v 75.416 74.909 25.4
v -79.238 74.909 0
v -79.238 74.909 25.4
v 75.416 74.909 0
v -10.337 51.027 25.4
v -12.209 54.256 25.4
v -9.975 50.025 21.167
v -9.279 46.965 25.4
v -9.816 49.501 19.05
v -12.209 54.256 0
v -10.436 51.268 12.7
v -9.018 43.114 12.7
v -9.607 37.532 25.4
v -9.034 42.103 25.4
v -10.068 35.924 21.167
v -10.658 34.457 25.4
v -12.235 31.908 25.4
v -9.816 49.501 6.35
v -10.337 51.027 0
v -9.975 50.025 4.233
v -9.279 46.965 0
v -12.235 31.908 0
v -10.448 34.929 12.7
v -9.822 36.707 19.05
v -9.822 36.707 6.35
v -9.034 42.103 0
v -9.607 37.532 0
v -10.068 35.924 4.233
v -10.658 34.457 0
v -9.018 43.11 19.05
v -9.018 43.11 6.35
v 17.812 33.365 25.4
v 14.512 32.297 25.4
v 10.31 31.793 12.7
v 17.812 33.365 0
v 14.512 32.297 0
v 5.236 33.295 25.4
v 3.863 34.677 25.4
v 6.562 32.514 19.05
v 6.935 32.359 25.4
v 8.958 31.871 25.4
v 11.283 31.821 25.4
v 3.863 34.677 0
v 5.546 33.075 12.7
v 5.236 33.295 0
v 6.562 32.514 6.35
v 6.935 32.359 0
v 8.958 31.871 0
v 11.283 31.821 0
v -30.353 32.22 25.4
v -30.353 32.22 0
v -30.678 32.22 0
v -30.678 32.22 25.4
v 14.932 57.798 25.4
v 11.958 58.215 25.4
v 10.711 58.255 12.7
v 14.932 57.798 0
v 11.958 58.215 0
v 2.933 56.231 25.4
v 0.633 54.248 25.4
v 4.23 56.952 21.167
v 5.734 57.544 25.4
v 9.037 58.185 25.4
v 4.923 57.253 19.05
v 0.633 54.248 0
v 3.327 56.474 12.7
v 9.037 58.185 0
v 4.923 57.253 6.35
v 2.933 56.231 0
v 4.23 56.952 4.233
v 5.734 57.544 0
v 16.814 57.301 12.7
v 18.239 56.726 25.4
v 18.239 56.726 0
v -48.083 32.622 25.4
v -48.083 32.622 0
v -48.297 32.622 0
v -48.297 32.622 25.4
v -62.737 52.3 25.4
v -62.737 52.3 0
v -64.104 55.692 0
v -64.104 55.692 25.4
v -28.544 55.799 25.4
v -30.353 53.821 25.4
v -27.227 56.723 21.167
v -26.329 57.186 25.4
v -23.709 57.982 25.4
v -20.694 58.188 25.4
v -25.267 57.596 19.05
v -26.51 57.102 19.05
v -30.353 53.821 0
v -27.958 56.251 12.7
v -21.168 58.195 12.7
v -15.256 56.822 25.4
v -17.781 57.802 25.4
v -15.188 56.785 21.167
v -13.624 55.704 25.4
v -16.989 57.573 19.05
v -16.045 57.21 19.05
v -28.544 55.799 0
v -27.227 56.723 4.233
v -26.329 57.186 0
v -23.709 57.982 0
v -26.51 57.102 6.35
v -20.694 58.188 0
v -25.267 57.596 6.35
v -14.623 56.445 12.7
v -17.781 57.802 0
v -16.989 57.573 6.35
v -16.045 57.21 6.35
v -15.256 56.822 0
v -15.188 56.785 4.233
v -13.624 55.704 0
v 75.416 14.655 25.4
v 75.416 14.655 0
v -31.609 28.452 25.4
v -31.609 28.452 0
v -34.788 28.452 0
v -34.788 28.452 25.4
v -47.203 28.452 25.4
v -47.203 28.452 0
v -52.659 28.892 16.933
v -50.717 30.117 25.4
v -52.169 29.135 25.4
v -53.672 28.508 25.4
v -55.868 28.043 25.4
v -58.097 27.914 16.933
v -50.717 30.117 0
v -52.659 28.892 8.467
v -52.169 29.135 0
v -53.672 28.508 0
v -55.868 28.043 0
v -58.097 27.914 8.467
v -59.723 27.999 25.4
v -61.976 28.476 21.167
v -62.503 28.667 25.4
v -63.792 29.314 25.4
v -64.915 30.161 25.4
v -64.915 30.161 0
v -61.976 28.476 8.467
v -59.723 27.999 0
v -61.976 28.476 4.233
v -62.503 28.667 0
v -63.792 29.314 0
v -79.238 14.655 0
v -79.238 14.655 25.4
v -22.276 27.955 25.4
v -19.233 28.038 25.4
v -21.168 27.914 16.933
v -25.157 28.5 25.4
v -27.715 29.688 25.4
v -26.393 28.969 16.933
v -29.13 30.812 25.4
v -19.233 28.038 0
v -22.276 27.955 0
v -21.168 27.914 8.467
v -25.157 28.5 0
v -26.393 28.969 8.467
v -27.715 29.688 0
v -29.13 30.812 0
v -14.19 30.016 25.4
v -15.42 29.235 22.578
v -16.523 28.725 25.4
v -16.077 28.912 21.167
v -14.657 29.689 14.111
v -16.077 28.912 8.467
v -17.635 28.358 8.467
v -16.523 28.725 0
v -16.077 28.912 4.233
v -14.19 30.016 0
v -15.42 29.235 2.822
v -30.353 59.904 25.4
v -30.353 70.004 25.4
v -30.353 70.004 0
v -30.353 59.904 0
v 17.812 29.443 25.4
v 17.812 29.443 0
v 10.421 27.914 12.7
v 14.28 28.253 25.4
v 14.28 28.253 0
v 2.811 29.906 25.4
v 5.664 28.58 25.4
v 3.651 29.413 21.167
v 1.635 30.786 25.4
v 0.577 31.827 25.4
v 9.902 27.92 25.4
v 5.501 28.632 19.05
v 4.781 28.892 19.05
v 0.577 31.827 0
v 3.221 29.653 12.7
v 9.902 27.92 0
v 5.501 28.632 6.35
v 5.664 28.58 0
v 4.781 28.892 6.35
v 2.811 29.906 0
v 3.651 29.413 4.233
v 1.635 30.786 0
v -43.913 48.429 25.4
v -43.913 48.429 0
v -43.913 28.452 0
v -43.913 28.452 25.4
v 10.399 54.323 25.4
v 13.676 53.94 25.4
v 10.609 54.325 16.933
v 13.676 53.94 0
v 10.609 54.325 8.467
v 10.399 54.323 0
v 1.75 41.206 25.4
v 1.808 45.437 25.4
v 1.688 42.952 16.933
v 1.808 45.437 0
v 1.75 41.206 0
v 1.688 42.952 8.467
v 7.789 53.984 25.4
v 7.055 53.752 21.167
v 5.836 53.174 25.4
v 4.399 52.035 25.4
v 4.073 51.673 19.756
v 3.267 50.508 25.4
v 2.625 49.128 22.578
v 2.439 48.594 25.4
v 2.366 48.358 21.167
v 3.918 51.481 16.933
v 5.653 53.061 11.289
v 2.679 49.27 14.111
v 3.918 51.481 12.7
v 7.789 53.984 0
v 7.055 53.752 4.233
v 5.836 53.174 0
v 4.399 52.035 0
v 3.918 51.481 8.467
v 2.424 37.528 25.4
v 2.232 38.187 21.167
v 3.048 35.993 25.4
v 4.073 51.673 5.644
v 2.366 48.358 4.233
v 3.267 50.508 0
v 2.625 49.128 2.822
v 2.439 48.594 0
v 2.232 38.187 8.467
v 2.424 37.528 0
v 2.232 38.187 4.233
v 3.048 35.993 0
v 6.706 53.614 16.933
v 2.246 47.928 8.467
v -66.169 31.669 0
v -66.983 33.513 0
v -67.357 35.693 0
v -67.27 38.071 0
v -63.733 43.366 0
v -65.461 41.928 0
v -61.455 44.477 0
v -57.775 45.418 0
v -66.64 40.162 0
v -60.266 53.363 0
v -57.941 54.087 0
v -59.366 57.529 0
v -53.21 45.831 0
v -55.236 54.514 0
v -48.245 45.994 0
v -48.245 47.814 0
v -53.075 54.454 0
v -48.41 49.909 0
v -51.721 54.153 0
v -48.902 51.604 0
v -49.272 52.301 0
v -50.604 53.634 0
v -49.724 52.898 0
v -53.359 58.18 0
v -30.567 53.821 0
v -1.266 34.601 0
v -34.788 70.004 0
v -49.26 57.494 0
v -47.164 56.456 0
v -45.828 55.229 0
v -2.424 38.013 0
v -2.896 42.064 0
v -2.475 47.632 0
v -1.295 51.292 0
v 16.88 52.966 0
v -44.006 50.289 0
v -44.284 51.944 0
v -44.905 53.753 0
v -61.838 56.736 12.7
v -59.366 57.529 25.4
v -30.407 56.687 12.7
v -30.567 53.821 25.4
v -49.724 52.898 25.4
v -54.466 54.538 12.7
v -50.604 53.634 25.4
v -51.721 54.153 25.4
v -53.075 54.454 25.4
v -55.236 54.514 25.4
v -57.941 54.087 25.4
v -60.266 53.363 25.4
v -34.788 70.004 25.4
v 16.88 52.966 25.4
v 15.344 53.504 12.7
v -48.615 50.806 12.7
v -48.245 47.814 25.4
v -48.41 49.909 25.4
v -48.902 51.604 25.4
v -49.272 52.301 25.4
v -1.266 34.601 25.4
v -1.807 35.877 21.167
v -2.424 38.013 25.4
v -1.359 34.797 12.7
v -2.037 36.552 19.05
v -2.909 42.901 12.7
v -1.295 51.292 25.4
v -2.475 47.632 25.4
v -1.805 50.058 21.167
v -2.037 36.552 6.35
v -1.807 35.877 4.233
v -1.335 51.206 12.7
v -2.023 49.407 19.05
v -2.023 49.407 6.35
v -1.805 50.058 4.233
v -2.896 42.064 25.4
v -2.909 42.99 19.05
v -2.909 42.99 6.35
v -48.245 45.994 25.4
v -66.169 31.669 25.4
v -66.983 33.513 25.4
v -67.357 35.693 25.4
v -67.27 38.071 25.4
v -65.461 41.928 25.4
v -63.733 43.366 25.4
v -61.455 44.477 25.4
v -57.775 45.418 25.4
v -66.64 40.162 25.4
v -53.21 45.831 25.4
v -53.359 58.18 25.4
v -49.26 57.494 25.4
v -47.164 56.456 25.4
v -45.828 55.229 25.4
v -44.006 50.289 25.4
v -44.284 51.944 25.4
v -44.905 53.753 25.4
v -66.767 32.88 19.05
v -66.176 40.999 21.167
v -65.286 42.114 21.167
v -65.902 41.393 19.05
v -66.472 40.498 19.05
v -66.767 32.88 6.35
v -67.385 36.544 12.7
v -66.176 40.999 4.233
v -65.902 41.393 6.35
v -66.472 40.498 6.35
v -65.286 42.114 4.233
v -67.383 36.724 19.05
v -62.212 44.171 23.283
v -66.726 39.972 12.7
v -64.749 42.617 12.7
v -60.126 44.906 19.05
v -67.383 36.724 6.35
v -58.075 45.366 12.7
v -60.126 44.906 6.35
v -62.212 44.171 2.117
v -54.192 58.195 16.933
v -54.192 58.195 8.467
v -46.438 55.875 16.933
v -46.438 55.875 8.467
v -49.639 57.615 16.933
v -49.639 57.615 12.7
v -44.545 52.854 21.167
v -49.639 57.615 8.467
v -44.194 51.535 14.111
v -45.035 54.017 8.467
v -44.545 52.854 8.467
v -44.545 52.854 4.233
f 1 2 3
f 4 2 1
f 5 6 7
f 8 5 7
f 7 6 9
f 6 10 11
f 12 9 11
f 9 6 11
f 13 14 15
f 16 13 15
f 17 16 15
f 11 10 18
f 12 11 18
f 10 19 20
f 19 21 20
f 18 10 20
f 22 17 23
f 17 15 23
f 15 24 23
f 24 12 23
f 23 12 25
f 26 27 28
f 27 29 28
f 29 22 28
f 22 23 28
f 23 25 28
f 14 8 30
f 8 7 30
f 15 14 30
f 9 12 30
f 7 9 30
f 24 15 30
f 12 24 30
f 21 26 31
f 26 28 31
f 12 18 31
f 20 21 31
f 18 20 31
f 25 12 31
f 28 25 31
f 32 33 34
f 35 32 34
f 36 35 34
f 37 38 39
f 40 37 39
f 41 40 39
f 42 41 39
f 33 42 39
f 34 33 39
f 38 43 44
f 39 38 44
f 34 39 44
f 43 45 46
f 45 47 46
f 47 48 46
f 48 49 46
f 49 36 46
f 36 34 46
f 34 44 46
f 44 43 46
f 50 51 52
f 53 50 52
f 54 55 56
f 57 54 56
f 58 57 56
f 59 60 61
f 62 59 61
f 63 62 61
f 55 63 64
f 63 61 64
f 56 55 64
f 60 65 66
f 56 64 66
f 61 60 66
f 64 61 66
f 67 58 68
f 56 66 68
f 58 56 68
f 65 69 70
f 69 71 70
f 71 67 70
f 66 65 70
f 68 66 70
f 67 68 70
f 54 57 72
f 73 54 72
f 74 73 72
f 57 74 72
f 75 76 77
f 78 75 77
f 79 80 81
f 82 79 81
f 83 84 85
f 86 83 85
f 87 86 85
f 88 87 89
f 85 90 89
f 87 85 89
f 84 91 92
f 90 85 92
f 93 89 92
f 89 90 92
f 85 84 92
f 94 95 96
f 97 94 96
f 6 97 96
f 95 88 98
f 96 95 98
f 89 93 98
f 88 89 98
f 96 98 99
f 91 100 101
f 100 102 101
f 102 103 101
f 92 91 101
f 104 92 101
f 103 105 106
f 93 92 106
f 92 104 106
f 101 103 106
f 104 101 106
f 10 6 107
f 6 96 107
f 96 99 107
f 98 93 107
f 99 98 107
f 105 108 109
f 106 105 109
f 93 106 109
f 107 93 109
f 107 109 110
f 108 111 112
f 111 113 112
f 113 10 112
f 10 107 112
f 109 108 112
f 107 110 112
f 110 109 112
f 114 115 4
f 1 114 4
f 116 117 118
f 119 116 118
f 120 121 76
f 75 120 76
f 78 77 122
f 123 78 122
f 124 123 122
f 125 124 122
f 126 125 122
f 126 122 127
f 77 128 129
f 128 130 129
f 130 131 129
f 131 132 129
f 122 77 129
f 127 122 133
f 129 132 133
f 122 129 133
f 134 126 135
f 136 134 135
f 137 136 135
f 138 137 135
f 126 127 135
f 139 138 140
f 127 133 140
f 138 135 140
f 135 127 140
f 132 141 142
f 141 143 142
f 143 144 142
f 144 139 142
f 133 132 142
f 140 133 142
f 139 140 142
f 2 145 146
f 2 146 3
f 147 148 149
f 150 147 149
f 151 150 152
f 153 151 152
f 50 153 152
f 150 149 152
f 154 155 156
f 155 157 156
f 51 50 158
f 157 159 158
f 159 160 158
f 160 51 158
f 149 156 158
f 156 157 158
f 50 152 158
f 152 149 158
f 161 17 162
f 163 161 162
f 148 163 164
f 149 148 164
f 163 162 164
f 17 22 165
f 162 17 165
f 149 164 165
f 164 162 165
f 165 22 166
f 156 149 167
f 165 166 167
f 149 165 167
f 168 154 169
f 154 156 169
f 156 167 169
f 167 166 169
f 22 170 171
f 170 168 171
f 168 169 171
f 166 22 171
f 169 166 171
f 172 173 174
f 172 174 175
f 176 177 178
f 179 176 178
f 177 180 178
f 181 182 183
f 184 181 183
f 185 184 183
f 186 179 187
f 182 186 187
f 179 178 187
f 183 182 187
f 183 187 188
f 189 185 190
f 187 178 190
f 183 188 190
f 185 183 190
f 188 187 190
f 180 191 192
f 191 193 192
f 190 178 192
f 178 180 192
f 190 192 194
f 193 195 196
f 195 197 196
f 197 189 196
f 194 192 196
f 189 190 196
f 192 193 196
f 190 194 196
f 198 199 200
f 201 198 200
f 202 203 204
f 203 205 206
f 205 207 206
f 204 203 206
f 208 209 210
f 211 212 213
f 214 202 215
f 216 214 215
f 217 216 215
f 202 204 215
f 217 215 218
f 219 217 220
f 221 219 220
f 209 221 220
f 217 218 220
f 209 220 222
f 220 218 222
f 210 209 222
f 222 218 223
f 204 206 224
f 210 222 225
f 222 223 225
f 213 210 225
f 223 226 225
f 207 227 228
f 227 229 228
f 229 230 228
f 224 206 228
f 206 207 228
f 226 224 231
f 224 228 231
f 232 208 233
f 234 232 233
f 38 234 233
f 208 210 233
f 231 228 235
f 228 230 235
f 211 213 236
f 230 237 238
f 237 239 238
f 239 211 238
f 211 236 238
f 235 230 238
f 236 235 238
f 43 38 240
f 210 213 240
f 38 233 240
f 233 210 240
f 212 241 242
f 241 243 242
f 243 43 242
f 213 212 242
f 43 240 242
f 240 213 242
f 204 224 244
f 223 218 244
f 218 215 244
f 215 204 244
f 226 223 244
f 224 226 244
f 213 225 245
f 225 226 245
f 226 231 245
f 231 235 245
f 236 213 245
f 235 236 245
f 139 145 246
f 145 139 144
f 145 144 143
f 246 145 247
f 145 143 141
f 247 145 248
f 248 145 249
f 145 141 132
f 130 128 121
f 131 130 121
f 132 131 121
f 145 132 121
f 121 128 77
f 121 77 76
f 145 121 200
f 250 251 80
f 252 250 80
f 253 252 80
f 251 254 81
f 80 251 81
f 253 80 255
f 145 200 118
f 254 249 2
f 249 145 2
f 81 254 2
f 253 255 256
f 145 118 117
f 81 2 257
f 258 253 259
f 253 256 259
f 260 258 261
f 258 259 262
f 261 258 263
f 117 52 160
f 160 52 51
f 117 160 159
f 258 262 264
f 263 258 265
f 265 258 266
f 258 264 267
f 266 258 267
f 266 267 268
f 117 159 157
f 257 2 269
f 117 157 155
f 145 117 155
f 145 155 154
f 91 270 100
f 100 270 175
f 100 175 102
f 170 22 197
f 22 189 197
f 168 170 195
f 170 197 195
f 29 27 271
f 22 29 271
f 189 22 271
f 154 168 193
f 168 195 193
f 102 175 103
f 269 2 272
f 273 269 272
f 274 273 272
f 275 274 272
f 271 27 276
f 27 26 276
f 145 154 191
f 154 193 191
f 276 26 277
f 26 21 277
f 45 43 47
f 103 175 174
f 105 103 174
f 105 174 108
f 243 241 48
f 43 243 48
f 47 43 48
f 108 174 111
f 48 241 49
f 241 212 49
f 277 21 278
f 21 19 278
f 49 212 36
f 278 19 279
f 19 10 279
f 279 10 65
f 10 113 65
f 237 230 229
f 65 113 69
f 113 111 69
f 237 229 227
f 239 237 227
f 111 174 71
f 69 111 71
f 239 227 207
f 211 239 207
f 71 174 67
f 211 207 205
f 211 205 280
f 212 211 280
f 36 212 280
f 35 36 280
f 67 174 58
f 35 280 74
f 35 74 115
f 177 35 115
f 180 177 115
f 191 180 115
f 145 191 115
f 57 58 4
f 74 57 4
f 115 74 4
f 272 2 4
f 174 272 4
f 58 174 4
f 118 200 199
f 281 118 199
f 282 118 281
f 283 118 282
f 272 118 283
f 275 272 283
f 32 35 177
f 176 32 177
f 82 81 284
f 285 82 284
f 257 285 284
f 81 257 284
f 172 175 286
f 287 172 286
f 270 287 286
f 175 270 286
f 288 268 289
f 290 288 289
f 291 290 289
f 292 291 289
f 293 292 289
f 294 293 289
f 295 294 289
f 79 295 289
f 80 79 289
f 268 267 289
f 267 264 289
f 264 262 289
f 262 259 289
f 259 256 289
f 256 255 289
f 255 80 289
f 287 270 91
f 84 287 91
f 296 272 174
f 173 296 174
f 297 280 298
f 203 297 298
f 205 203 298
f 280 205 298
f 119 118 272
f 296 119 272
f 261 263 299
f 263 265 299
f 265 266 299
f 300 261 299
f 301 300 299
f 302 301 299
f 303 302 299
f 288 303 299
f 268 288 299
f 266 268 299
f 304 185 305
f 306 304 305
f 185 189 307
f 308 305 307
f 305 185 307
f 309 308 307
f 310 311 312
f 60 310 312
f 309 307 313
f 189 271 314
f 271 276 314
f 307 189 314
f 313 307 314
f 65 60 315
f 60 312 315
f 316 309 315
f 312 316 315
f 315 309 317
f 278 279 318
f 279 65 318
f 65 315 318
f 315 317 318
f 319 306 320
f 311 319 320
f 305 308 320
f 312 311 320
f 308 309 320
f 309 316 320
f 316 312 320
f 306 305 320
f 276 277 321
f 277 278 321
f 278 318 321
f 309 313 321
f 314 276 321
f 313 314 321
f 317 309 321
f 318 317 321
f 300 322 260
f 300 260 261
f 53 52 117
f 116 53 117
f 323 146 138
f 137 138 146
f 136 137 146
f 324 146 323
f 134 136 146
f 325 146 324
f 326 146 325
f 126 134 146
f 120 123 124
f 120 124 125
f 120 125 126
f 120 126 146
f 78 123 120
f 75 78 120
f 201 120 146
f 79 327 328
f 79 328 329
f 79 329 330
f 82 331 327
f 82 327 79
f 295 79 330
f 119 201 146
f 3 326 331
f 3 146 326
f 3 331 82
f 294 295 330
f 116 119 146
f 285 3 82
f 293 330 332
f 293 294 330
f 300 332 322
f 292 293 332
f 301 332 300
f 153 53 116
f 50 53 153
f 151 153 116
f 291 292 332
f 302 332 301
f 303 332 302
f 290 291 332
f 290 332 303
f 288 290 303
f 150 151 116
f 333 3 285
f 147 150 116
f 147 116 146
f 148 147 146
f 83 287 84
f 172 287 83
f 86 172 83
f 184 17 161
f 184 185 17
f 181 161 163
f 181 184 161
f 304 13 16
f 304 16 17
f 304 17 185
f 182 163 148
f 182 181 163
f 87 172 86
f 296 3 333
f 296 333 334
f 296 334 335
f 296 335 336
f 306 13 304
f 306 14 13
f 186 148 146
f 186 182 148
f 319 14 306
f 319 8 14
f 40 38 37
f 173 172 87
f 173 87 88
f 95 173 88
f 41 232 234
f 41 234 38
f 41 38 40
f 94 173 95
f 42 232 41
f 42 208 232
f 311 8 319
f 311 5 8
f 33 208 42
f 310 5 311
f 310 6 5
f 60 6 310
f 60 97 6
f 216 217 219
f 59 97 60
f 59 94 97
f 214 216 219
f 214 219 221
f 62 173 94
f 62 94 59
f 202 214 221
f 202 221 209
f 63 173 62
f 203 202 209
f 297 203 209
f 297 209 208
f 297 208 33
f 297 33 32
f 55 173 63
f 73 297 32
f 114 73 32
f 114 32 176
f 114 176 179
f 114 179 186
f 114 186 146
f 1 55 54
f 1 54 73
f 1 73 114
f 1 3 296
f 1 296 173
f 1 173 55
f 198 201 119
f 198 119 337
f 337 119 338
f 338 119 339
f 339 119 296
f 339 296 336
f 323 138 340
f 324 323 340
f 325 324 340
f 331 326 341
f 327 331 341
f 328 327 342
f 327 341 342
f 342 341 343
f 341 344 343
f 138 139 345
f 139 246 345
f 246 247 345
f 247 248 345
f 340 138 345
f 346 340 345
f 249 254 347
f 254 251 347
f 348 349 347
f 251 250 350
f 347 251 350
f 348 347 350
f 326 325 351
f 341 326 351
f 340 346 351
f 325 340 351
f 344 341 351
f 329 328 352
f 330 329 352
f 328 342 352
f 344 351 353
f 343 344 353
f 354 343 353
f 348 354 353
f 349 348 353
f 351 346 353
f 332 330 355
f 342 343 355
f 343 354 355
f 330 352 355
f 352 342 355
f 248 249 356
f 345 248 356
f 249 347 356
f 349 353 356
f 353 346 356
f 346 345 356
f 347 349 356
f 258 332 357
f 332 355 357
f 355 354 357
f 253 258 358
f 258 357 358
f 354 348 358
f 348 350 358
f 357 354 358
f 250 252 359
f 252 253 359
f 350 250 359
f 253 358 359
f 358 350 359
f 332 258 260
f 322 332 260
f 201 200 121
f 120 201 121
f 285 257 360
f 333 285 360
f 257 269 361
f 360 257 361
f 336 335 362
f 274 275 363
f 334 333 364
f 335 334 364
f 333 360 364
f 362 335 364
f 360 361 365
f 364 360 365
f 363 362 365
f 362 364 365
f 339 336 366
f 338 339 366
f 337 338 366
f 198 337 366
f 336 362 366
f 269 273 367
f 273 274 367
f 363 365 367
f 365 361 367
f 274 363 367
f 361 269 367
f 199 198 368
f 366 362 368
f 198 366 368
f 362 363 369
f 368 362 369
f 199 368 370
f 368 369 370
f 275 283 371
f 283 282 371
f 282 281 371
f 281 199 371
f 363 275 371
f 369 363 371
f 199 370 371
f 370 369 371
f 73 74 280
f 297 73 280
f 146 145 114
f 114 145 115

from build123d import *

# Parameters (mm, degrees)
F1_W     = 154.6539068222
F1_H     = 60.2537170053
F2_DEPTH = 25.4


with BuildPart() as f2:
    # F1 (on face) → F2 (new body)
    with BuildSketch(Plane.XY):
        with Locations((-1.9112378359, 44.7821803391)):
            Rectangle(F1_W, F1_H)
        with BuildLine():
            Line((-43.9133035187, 28.4521430731), (-47.2029023286, 28.4521430731))
            Line((-47.2029023286, 28.4521430731), (-48.0829768154, 32.6218163698))
            Line((-48.0829768154, 32.6218163698), (-48.2965871278, 32.6218163698))
            add(Edge.make_bspline(
                [(-48.2965871278, 32.6218163698), (-50.4839567261, 29.870515547), (-52.6585097056, 28.8921803165)],
                knots=[0, 0, 0, 1, 1, 1], degree=2))
            add(Edge.make_bspline(
                [(-52.6585097056, 28.8921803165), (-54.8330626851, 27.913845086), (-58.0970282576, 27.913845086)],
                knots=[0, 0, 0, 1, 1, 1], degree=2))
            add(Edge.make_bspline(
                [(-58.0970282576, 27.913845086), (-62.4461342167, 27.913845086), (-64.9154694272, 30.1610255717)],
                knots=[0, 0, 0, 1, 1, 1], degree=2))
            add(Edge.make_bspline(
                [(-64.9154694272, 30.1610255717), (-67.3848046378, 32.4082060575), (-67.3848046378, 36.5437017042)],
                knots=[0, 0, 0, 1, 1, 1], degree=2))
            add(Edge.make_bspline(
                [(-67.3848046378, 36.5437017042), (-67.3848046378, 45.4042574598), (-53.2096243114, 45.8314780844)],
                knots=[0, 0, 0, 1, 1, 1], degree=2))
            Line((-53.2096243114, 45.8314780844), (-48.2453206528, 45.9938219218))
            Line((-48.2453206528, 45.9938219218), (-48.2453206528, 47.8137817829))
            add(Edge.make_bspline(
                [(-48.2453206528, 47.8137817829), (-48.2453206528, 51.2571800177), (-49.7235040142, 52.8977072164)],
                knots=[0, 0, 0, 1, 1, 1], degree=2))
            add(Edge.make_bspline(
                [(-49.7235040142, 52.8977072164), (-51.2016873755, 54.5382344151), (-54.4656529479, 54.5382344151)],
                knots=[0, 0, 0, 1, 1, 1], degree=2))
            add(Edge.make_bspline(
                [(-54.4656529479, 54.5382344151), (-58.1226614951, 54.5382344151), (-62.7366442414, 52.2995983419)],
                knots=[0, 0, 0, 1, 1, 1], degree=2))
            Line((-62.7366442414, 52.2995983419), (-64.1037502404, 55.6917301017))
            add(Edge.make_bspline(
                [(-64.1037502404, 55.6917301017), (-61.9420138796, 56.8623146133), (-59.3658735128, 57.5287787878)],
                knots=[0, 0, 0, 1, 1, 1], degree=2))
            add(Edge.make_bspline(
                [(-59.3658735128, 57.5287787878), (-56.7897331461, 58.1952429622), (-54.1922317481, 58.1952429622)],
                knots=[0, 0, 0, 1, 1, 1], degree=2))
            add(Edge.make_bspline(
                [(-54.1922317481, 58.1952429622), (-48.9630513023, 58.1952429622), (-46.4381774105, 55.8754349703)],
                knots=[0, 0, 0, 1, 1, 1], degree=2))
            add(Edge.make_bspline(
                [(-46.4381774105, 55.8754349703), (-43.9133035187, 53.5556269784), (-43.9133035187, 48.4289794824)],
                knots=[0, 0, 0, 1, 1, 1], degree=2))
            Line((-43.9133035187, 48.4289794824), (-43.9133035187, 28.4521430731))
        make_face(mode=Mode.SUBTRACT)
        with BuildLine():
            add(Edge.make_bspline(
                [(17.8115323328, 29.4432949223), (14.8807988476, 27.913845086), (10.4206155261, 27.913845086)],
                knots=[0, 0, 0, 1, 1, 1], degree=2))
            add(Edge.make_bspline(
                [(10.4206155261, 27.913845086), (4.0635726311, 27.913845086), (0.5774523339, 31.8271860079)],
                knots=[0, 0, 0, 1, 1, 1], degree=2))
            add(Edge.make_bspline(
                [(0.5774523339, 31.8271860079), (-2.9086679634, 35.7405269299), (-2.9086679634, 42.9007445992)],
                knots=[0, 0, 0, 1, 1, 1], degree=2))
            add(Edge.make_bspline(
                [(-2.9086679634, 42.9007445992), (-2.9086679634, 50.240394931), (0.6329910151, 54.2477243903)],
                knots=[0, 0, 0, 1, 1, 1], degree=2))
            add(Edge.make_bspline(
                [(0.6329910151, 54.2477243903), (4.1746499935, 58.2550538497), (10.7111255509, 58.2550538497)],
                knots=[0, 0, 0, 1, 1, 1], degree=2))
            add(Edge.make_bspline(
                [(10.7111255509, 58.2550538497), (12.8215954367, 58.2550538497), (14.9320653226, 57.7979277813)],
                knots=[0, 0, 0, 1, 1, 1], degree=2))
            add(Edge.make_bspline(
                [(14.9320653226, 57.7979277813), (17.0425352084, 57.3408017129), (18.2387529575, 56.7256040134)],
                knots=[0, 0, 0, 1, 1, 1], degree=2))
            Line((18.2387529575, 56.7256040134), (16.8801913711, 52.9660625163))
            add(Edge.make_bspline(
                [(16.8801913711, 52.9660625163), (15.4105524222, 53.5556269784), (13.6760366861, 53.9401255406)],
                knots=[0, 0, 0, 1, 1, 1], degree=2))
            add(Edge.make_bspline(
                [(13.6760366861, 53.9401255406), (11.9415209499, 54.3246241028), (10.608592601, 54.3246241028)],
                knots=[0, 0, 0, 1, 1, 1], degree=2))
            add(Edge.make_bspline(
                [(10.608592601, 54.3246241028), (1.688225958, 54.3246241028), (1.688225958, 42.9520110742)],
                knots=[0, 0, 0, 1, 1, 1], degree=2))
            add(Edge.make_bspline(
                [(1.688225958, 42.9520110742), (1.688225958, 37.5604867909), (3.8627789375, 34.6767475744)],
                knots=[0, 0, 0, 1, 1, 1], degree=2))
            add(Edge.make_bspline(
                [(3.8627789375, 34.6767475744), (6.0373319171, 31.793008358), (10.3095381637, 31.793008358)],
                knots=[0, 0, 0, 1, 1, 1], degree=2))
            add(Edge.make_bspline(
                [(10.3095381637, 31.793008358), (13.9665467108, 31.793008358), (17.8115323328, 33.3651802567)],
                knots=[0, 0, 0, 1, 1, 1], degree=2))
            Line((17.8115323328, 33.3651802567), (17.8115323328, 29.4432949223))
        make_face(mode=Mode.SUBTRACT)
        with BuildLine():
            add(Edge.make_bspline(
                [(-30.3533208919, 53.8205037657), (-27.2602435693, 58.1952429622), (-21.1680774616, 58.1952429622)],
                knots=[0, 0, 0, 1, 1, 1], degree=2))
            add(Edge.make_bspline(
                [(-21.1680774616, 58.1952429622), (-15.4005990286, 58.1952429622), (-12.2092609624, 54.2562688028)],
                knots=[0, 0, 0, 1, 1, 1], degree=2))
            add(Edge.make_bspline(
                [(-12.2092609624, 54.2562688028), (-9.0179228961, 50.3172946434), (-9.0179228961, 43.1143549116)],
                knots=[0, 0, 0, 1, 1, 1], degree=2))
            add(Edge.make_bspline(
                [(-9.0179228961, 43.1143549116), (-9.0179228961, 35.9028707672), (-12.2348941998, 31.9083579266)],
                knots=[0, 0, 0, 1, 1, 1], degree=2))
            add(Edge.make_bspline(
                [(-12.2348941998, 31.9083579266), (-15.4518655036, 27.913845086), (-21.1680774616, 27.913845086)],
                knots=[0, 0, 0, 1, 1, 1], degree=2))
            add(Edge.make_bspline(
                [(-21.1680774616, 27.913845086), (-24.0304556468, 27.913845086), (-26.3929857012, 28.9690800289)],
                knots=[0, 0, 0, 1, 1, 1], degree=2))
            add(Edge.make_bspline(
                [(-26.3929857012, 28.9690800289), (-28.7555157556, 30.0243149718), (-30.3533208919, 32.2202289826)],
                knots=[0, 0, 0, 1, 1, 1], degree=2))
            Line((-30.3533208919, 32.2202289826), (-30.6780085666, 32.2202289826))
            Line((-30.6780085666, 32.2202289826), (-31.6093495284, 28.4521430731))
            Line((-31.6093495284, 28.4521430731), (-34.7878709759, 28.4521430731))
            Line((-34.7878709759, 28.4521430731), (-34.7878709759, 70.003621028))
            Line((-34.7878709759, 70.003621028), (-30.3533208919, 70.003621028))
            Line((-30.3533208919, 70.003621028), (-30.3533208919, 59.9041254609))
            add(Edge.make_bspline(
                [(-30.3533208919, 59.9041254609), (-30.3533208919, 56.5119937011), (-30.5669312042, 53.8205037657)],
                knots=[0, 0, 0, 1, 1, 1], degree=2))
            Line((-30.5669312042, 53.8205037657), (-30.3533208919, 53.8205037657))
        make_face(mode=Mode.SUBTRACT)
    extrude(amount=F2_DEPTH)


solid = f2.part
